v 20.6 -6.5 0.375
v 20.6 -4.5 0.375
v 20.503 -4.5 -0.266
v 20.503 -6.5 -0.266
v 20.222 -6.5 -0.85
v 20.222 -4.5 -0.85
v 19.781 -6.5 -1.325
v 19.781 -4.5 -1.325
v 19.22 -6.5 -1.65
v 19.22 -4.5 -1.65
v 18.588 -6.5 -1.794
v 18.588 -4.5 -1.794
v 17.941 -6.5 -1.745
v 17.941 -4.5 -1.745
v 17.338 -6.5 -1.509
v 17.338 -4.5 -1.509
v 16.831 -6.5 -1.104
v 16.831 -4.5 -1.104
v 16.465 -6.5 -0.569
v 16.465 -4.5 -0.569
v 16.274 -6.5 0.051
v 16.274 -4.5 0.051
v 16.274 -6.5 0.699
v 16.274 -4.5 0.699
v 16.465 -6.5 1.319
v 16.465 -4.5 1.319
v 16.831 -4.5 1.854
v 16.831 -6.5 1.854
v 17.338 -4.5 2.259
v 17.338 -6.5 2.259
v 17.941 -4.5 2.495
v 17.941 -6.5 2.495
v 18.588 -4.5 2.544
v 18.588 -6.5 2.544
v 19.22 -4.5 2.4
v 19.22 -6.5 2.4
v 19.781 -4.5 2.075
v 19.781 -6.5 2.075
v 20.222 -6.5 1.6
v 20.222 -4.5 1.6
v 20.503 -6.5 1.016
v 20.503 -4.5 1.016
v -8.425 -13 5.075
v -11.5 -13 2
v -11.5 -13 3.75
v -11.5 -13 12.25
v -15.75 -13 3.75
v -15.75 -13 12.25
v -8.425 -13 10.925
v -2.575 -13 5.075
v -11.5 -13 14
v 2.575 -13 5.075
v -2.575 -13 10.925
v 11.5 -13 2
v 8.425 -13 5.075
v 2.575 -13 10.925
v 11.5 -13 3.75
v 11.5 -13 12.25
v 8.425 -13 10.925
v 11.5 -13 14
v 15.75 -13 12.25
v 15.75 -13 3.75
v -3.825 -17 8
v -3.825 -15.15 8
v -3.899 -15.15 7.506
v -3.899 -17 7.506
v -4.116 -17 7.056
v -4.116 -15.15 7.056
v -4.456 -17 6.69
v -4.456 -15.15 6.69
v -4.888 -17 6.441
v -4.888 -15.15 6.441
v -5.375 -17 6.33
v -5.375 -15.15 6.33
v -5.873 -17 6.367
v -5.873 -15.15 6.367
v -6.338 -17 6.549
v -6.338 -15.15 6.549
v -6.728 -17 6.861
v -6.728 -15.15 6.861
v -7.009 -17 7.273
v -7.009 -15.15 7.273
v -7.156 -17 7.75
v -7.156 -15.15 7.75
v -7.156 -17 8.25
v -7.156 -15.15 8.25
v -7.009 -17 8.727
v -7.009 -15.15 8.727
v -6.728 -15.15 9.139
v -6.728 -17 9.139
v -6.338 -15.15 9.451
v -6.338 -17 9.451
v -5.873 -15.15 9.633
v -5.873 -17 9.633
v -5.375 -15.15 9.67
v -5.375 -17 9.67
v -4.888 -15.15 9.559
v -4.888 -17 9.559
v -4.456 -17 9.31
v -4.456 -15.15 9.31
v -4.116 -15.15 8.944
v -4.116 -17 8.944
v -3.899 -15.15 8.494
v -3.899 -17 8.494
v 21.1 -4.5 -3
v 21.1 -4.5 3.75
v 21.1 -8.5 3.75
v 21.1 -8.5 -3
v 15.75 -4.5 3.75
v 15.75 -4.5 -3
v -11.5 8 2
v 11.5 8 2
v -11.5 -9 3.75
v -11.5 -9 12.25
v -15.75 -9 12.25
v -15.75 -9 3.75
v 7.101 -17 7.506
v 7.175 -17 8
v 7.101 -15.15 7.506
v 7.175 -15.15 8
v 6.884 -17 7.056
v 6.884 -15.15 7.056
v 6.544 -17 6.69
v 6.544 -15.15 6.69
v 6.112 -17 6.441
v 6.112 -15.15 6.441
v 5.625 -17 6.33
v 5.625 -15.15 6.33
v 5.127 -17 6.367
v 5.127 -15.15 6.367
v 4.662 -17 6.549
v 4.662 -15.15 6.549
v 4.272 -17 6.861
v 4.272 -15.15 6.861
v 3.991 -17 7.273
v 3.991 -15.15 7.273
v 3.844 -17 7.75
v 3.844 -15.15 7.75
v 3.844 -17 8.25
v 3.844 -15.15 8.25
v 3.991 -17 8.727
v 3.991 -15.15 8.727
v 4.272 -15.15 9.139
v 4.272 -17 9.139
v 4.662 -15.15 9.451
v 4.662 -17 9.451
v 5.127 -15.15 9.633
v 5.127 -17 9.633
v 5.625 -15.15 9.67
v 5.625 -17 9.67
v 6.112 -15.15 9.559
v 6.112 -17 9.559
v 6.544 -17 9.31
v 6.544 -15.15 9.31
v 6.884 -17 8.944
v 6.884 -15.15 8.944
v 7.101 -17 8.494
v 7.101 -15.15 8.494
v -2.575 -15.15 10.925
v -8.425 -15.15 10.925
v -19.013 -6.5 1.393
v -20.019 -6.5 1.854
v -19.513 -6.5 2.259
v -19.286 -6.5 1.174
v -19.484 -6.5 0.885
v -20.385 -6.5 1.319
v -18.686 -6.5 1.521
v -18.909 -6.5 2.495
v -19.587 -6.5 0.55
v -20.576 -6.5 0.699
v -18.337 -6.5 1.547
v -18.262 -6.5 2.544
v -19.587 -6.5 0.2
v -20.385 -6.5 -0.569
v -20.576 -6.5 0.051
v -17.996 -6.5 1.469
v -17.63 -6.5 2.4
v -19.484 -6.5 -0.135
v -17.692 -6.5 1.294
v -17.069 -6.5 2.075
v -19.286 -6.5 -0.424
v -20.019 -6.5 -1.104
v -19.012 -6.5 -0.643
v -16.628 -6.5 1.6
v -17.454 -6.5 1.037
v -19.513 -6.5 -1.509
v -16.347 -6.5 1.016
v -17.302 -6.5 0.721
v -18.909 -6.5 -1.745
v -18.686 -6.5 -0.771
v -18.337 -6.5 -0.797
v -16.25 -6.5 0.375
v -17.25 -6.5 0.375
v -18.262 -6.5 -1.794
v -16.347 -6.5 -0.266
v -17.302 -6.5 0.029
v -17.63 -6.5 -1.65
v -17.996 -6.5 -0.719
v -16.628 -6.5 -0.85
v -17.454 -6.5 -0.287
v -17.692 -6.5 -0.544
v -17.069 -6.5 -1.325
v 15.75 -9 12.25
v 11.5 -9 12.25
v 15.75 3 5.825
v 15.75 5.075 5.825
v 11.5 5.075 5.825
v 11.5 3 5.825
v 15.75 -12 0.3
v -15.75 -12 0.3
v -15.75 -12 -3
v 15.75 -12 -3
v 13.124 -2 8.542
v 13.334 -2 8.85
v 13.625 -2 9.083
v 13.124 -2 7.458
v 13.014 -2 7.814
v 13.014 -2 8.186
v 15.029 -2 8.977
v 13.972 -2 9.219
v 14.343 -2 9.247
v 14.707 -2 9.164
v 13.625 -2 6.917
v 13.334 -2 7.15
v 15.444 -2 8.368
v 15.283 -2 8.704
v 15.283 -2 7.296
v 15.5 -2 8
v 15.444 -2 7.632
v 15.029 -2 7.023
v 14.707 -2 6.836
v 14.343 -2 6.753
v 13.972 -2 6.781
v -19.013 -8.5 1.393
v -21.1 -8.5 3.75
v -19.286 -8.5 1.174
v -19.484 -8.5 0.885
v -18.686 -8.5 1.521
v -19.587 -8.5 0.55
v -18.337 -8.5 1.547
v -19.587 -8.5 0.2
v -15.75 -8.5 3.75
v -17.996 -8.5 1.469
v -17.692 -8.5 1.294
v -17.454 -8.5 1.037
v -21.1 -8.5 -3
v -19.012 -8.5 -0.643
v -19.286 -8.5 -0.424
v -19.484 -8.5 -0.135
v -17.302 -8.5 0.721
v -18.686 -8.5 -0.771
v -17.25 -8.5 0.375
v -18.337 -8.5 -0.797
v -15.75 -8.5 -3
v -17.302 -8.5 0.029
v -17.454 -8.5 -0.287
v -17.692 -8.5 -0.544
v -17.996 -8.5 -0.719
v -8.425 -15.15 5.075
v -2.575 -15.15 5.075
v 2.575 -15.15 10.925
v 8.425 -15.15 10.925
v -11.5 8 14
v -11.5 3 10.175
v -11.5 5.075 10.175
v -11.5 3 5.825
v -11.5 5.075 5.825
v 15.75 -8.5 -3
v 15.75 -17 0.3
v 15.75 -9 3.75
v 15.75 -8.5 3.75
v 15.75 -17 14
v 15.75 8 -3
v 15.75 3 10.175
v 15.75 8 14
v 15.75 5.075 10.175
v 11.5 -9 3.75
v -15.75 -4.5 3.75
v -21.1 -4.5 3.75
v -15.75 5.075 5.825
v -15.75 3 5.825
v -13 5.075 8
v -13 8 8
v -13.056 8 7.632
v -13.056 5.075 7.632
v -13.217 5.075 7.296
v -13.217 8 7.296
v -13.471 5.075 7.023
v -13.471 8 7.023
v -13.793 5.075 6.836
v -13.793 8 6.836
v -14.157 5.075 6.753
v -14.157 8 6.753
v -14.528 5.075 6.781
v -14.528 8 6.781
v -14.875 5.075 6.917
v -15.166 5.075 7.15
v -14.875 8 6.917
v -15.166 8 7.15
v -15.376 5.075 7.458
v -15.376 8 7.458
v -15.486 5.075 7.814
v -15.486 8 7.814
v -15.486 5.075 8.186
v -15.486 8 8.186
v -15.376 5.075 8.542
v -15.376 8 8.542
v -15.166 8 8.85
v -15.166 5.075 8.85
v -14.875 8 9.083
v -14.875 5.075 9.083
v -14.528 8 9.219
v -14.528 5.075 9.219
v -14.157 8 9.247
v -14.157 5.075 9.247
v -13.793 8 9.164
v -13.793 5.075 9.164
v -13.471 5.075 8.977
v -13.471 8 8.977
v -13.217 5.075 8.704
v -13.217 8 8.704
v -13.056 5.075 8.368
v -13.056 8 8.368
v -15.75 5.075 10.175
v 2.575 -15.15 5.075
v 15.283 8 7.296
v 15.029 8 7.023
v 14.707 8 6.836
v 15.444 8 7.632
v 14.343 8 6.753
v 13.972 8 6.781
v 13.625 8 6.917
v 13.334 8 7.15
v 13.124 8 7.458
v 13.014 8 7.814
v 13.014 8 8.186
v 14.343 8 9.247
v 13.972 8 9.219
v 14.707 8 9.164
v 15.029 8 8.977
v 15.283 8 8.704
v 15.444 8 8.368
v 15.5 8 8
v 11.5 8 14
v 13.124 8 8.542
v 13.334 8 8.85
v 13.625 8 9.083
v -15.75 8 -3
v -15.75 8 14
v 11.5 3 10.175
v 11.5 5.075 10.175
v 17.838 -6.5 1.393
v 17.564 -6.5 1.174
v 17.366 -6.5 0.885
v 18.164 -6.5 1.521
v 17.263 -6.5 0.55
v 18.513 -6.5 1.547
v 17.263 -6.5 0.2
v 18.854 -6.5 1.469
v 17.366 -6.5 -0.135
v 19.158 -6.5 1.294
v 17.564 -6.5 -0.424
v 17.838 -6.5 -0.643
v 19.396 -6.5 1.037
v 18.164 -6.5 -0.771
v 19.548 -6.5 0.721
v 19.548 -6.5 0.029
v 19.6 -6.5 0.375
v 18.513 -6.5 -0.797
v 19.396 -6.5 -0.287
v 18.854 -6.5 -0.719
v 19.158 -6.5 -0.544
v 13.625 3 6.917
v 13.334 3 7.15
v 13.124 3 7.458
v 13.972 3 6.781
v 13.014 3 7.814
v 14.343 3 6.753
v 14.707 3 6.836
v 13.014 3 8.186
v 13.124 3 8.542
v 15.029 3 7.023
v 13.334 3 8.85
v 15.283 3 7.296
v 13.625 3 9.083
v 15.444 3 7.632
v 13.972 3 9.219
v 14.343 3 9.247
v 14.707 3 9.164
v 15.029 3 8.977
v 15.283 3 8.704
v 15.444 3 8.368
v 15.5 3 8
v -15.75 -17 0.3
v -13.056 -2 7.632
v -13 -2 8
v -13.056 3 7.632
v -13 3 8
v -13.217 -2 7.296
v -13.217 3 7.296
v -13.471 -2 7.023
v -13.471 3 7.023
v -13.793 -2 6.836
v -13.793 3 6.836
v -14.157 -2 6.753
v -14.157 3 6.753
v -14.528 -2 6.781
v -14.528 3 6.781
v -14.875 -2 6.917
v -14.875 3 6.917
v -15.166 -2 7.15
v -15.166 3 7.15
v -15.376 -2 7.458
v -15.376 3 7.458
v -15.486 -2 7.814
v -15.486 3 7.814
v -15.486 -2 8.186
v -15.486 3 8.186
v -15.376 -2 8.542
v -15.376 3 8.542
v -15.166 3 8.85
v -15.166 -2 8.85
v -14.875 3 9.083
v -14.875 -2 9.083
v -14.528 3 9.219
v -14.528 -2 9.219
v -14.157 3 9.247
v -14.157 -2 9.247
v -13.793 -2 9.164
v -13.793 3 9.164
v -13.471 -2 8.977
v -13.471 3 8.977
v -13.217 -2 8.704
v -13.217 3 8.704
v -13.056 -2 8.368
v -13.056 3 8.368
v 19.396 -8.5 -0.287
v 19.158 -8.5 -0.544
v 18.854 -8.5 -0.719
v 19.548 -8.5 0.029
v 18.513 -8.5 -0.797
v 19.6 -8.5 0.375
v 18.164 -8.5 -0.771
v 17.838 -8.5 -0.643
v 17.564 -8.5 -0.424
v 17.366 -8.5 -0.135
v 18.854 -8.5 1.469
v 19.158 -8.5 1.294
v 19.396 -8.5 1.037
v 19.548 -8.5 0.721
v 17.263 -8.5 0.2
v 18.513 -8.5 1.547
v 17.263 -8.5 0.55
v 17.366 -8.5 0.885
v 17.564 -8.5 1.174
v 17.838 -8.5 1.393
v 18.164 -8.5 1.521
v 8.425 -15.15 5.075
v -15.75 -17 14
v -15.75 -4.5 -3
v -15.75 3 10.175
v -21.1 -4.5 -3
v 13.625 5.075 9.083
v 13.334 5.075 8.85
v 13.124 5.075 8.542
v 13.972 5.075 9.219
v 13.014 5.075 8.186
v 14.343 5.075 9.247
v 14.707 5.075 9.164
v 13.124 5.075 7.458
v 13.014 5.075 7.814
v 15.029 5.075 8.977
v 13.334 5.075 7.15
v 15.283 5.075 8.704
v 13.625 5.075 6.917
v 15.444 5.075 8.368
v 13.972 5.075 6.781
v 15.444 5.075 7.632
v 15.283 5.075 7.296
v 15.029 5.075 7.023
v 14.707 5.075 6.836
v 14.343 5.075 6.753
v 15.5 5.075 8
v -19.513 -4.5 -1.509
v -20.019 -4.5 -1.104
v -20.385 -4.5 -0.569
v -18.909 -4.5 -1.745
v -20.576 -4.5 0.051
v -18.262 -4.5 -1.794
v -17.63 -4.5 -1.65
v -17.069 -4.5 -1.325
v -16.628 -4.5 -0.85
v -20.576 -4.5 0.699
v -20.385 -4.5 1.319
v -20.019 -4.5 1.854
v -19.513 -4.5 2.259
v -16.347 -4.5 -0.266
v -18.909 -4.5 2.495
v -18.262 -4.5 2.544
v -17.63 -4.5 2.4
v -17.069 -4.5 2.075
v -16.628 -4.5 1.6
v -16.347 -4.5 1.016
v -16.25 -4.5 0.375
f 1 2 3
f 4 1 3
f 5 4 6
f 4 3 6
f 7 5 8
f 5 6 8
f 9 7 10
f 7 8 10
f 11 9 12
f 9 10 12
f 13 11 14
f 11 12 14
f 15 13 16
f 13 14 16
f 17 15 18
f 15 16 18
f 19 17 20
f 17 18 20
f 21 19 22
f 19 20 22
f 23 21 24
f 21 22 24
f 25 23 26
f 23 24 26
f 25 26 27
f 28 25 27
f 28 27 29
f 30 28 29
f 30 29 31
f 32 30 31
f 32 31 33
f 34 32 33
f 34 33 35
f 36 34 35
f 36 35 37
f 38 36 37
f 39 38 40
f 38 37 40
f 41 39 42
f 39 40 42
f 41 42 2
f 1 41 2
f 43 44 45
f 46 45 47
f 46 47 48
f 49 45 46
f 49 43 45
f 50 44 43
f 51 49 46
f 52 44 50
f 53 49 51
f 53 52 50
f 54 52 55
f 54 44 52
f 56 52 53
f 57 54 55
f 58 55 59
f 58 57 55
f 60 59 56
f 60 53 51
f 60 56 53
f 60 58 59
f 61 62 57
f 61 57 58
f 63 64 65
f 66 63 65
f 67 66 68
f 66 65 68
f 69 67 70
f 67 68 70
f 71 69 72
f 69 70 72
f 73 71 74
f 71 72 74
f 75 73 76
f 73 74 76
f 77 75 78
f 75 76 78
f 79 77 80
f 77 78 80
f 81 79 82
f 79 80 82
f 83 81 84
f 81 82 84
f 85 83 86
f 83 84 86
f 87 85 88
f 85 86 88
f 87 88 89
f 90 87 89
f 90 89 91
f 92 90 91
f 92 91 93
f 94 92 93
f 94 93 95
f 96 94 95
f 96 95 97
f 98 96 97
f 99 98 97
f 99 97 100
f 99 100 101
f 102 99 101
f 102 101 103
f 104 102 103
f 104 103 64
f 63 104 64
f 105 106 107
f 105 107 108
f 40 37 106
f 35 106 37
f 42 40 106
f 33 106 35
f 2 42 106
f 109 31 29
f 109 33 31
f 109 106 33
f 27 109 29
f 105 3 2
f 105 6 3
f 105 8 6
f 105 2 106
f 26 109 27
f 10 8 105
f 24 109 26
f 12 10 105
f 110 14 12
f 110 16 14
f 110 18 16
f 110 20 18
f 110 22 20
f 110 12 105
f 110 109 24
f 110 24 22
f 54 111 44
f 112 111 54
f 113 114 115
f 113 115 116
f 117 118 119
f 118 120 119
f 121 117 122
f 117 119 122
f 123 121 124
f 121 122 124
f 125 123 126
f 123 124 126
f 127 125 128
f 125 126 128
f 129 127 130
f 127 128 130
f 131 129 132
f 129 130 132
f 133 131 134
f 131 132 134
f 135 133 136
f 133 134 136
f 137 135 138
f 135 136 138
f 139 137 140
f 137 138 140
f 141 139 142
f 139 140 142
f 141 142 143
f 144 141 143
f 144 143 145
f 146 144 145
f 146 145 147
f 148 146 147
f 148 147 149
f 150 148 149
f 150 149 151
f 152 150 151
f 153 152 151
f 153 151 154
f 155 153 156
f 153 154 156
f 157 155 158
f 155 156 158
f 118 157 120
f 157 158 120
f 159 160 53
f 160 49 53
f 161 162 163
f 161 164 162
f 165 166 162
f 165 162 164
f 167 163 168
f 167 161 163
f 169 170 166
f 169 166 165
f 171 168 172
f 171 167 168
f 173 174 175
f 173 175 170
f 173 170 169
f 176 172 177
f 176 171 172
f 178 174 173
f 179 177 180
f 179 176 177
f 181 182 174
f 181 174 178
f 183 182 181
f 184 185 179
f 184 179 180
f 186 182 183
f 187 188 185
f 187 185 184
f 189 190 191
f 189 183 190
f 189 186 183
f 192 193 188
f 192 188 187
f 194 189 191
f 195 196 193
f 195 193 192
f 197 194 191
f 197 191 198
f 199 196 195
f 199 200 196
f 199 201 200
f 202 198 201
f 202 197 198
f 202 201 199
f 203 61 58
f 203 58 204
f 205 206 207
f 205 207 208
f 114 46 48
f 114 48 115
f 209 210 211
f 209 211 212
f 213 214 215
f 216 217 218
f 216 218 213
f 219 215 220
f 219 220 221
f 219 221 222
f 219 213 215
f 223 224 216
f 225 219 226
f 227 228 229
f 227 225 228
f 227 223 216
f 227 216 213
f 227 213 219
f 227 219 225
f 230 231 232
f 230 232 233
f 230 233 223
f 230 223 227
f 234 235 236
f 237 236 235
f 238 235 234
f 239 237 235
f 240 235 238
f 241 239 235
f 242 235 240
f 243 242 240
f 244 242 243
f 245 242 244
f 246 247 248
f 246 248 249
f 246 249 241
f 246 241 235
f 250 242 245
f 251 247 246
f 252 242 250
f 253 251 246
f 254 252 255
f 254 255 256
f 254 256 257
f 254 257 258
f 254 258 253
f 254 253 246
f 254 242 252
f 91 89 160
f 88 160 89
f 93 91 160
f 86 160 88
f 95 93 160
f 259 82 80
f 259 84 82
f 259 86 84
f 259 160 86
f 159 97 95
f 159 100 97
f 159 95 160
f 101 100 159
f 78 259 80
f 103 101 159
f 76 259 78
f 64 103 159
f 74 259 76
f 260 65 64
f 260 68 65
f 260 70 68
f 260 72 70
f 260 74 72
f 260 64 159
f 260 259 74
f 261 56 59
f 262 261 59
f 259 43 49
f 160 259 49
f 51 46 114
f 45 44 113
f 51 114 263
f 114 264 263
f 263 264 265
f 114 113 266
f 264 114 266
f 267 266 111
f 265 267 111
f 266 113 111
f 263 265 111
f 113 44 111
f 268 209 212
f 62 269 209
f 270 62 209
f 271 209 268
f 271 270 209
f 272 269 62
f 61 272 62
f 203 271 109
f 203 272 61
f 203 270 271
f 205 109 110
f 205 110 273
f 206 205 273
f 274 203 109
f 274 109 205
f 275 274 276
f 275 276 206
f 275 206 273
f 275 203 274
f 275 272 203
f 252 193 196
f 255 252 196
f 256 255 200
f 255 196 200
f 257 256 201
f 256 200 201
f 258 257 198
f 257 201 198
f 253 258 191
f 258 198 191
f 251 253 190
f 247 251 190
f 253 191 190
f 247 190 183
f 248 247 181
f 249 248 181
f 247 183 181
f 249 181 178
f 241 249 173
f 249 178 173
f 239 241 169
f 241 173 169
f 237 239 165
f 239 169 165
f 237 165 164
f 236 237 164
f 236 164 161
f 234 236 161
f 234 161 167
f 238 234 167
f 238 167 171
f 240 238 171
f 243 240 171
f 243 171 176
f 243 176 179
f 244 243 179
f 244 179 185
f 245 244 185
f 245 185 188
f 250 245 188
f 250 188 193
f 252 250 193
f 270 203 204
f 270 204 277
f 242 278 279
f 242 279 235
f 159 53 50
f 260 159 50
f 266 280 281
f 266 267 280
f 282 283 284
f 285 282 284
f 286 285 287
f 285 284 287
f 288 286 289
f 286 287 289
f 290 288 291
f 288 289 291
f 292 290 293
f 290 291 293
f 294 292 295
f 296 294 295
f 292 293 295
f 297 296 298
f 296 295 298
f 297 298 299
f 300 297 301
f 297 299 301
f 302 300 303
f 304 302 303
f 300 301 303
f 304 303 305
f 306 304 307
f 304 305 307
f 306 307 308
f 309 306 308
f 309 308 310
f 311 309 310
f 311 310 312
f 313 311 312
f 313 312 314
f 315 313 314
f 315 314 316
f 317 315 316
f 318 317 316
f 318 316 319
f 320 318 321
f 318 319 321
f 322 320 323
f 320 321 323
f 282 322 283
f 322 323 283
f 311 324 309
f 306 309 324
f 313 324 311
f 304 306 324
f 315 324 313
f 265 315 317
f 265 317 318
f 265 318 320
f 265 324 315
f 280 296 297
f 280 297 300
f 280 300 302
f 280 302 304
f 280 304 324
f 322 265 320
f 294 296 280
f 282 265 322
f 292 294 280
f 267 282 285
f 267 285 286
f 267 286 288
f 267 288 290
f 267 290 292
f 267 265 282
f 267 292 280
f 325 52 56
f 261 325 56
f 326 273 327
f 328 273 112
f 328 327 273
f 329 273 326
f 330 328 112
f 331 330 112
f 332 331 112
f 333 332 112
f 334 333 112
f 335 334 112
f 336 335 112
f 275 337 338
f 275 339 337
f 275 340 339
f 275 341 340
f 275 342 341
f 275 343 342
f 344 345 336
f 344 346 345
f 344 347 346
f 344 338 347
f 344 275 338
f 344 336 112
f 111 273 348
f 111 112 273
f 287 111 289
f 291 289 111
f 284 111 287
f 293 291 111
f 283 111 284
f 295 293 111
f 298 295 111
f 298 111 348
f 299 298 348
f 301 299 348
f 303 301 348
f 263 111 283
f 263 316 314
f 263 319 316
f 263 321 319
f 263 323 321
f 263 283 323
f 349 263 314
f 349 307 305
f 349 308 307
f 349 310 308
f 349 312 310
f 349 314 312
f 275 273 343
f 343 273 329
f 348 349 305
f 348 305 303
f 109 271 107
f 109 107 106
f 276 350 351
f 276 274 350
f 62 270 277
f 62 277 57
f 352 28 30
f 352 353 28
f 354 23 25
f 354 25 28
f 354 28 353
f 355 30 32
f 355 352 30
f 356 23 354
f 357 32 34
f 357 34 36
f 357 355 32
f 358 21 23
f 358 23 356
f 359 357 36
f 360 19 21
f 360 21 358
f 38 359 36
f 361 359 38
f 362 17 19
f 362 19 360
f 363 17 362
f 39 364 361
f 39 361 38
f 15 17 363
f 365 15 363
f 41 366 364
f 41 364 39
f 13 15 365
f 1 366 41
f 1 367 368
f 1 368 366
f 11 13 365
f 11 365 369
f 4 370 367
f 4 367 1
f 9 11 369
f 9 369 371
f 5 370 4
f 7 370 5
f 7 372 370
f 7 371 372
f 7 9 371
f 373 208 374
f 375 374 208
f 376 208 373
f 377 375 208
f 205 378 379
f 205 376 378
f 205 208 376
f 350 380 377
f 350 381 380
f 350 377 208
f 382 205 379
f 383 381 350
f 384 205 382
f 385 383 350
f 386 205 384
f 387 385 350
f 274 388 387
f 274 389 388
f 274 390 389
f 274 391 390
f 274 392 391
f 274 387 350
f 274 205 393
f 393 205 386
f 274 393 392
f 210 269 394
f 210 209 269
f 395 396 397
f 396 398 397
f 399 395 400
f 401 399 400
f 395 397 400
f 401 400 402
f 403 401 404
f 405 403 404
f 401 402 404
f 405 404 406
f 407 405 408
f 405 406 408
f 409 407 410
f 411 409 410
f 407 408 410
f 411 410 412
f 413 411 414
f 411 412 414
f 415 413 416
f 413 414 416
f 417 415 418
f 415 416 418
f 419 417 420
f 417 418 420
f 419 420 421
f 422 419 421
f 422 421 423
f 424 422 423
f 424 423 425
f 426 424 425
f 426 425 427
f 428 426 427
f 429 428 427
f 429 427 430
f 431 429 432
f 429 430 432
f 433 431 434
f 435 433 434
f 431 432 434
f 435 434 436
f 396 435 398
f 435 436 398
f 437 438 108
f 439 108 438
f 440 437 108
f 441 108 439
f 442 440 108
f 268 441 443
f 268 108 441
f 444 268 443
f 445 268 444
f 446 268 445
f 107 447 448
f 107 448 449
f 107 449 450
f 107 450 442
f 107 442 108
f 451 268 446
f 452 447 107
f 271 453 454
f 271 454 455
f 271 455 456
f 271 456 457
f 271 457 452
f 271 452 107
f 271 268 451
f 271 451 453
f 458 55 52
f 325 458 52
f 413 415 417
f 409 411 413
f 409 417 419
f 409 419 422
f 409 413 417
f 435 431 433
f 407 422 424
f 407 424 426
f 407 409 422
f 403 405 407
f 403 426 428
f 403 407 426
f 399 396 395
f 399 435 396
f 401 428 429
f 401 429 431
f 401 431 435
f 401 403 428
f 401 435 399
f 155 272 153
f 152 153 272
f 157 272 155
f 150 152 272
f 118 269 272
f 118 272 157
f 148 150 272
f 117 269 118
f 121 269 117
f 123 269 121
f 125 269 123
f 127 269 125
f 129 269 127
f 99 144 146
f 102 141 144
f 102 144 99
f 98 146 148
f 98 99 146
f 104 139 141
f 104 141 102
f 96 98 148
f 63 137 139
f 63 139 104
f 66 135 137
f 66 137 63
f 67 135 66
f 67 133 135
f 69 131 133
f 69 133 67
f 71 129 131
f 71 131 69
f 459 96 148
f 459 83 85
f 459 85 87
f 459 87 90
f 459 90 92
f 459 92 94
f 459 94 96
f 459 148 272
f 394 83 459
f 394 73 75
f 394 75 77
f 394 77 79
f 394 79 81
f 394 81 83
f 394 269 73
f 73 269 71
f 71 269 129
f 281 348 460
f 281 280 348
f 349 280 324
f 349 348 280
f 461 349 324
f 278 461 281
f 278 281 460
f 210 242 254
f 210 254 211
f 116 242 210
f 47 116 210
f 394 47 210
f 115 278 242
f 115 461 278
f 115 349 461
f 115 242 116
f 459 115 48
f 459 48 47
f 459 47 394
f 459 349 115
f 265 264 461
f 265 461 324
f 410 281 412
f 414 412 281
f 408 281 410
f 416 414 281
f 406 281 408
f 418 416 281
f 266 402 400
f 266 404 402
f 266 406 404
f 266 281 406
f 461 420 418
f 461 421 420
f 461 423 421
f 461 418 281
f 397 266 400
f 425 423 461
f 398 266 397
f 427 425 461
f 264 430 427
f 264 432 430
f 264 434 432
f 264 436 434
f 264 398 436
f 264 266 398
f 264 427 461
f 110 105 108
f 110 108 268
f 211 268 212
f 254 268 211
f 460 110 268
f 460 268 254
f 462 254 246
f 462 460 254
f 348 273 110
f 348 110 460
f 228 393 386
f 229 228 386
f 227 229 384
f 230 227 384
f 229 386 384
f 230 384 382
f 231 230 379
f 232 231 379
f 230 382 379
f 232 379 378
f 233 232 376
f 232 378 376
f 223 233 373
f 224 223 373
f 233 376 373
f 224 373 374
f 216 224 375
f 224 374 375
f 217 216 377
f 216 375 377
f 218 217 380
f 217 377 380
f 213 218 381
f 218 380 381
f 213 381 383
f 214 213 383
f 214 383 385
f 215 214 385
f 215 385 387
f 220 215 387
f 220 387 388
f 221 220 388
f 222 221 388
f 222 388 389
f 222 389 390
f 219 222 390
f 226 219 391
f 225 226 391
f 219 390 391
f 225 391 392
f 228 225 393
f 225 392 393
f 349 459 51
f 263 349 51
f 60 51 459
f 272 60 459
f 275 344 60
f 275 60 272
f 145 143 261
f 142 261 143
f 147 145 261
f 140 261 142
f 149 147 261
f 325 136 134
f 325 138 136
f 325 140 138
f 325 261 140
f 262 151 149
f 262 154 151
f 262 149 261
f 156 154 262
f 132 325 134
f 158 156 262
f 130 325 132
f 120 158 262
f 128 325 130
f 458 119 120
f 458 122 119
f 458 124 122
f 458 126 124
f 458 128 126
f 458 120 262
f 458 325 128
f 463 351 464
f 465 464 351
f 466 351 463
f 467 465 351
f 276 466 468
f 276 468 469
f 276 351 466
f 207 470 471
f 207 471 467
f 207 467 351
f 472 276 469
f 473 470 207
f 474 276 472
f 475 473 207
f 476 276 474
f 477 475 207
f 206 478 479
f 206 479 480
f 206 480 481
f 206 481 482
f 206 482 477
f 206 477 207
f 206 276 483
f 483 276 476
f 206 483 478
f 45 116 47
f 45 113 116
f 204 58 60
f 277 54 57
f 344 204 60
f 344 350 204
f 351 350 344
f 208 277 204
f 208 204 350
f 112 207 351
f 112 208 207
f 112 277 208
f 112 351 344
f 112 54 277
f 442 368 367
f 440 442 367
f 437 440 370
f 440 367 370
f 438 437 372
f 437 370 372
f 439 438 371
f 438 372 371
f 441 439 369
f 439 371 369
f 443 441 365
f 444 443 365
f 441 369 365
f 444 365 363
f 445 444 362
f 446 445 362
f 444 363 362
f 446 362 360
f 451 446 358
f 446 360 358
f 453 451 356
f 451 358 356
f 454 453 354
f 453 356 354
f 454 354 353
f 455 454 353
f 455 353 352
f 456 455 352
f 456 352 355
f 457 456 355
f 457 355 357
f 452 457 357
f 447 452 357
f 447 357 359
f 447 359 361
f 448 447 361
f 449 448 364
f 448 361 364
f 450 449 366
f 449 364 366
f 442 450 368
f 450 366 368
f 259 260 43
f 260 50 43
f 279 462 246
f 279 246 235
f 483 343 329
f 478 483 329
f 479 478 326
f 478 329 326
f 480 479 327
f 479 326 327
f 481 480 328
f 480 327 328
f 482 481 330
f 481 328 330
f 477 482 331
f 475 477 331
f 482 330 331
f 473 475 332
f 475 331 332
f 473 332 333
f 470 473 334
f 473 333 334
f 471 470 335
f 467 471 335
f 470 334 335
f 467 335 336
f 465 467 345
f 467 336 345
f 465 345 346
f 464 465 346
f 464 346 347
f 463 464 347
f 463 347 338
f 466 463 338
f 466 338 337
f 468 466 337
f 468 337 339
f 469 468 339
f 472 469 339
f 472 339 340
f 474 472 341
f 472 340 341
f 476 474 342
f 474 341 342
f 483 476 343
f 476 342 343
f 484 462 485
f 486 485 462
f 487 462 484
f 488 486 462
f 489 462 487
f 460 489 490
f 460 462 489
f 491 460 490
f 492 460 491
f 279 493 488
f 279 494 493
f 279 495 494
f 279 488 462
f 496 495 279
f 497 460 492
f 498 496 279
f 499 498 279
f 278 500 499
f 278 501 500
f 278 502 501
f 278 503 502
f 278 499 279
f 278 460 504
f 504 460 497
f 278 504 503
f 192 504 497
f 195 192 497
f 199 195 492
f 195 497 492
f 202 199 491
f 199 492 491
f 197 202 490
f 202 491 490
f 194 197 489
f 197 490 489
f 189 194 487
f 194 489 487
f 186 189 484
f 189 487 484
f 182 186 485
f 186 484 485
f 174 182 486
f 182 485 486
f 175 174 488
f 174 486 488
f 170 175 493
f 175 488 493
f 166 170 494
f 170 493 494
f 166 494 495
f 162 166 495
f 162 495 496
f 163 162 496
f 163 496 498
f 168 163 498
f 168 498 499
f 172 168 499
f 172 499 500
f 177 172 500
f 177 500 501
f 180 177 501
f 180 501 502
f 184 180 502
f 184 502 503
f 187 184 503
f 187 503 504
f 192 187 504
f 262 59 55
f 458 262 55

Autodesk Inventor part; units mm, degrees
ref_plane "YZ Plane" through (0, 0, 0) normal (1, 0, 0) x (0, 1, 0)
ref_plane "XZ Plane" through (0, 0, 0) normal (0, 1, 0) x (-1, 0, 0)
ref_plane "XY Plane" through (0, 0, 0) normal (0, 0, 1) x (1, 0, 0)
sketch "Sketch1" plane through (0, 0, 0) normal (0, 0, 1) x (1, 0, 0)
  line L0 (-15.75, 17) -> (15.75, 17)
  line L1 (15.75, 17) -> (15.75, -17)
  line L2 (15.75, -17) -> (-15.75, -17)
  line L3 (-15.75, -17) -> (-15.75, 17)
  point P0 (0, 0)
  point P1 (15.75, 0)
  point P2 (0, 17)
  dimension "d0" = 34
  dimension "d1" = 31.5
extrude "Extrusion1" add sketch "Sketch1" along normal blind 2
sketch "Sketch2" plane through (0, 0, 2) normal (0, 0, 1) x (1, 0, 0)
  line L0 (-11.5, 8) -> (-15.75, 8)
  line L1 (-15.75, 8) -> (-15.75, -13)
  line L2 (-15.75, -13) -> (-11.5, -13)
  line L3 (-11.5, -13) -> (-11.5, 8)
  line L4 (11.5, 8) -> (15.75, 8)
  line L5 (15.75, 8) -> (15.75, -13)
  line L6 (15.75, -13) -> (11.5, -13)
  line L7 (11.5, -13) -> (11.5, 8)
  line L8 (15.75, -13) -> (-15.75, -13)
  line L9 (-15.75, -13) -> (-15.75, -17)
  line L10 (-15.75, -17) -> (15.75, -17)
  line L11 (15.75, -17) -> (15.75, -13)
  line L12 (-15.75, 17) -> (-15.75, -17) projected
  line L13 (15.75, 17) -> (-15.75, 17) projected
  line L14 (15.75, -17) -> (15.75, 17) projected
  line L15 (-15.75, -17) -> (15.75, -17) projected
  point P0 (0, 0)
  dimension "d4" = 23
  dimension "d5" = 4
  dimension "d67" = 21
extrude "Extrusion2" add sketch "Sketch2" along normal blind 12 contours L3 L2 L1 L0 | L8 L6 L11 L10 L9 L2 | L7 L4 L5 L6
sketch "Sketch8" plane through (-11.5, -13, 2) normal (0, 1, 0) x (1, 0, 0)
  circle A0 centre (6, -6) radius 6 construction
  circle A1 centre (17, -6) radius 6 construction
  line L0 (0, 0) -> (0, -12) construction
  line L1 (23, -12) -> (0, -12) construction
  line L2 (0, 0) -> (23, 0) construction
  line L3 (23, 0) -> (23, -12) construction
  circle A2 centre (6, -6) radius 1.675
  circle A3 centre (17, -6) radius 1.675
  point P0 (11.5, 2)
  dimension "d29" = 3.35
extrude "Extrusion8" cut sketch "Sketch8" against normal through all
sketch "Sketch9" plane through (-11.5, -13, 2) normal (0, 1, 0) x (1, 0, 0)
  line L0 (3.075, -8.925) -> (8.925, -8.925)
  line L1 (8.925, -8.925) -> (8.925, -3.075)
  line L2 (8.925, -3.075) -> (3.075, -3.075)
  line L3 (3.075, -3.075) -> (3.075, -8.925)
  line L4 (14.075, -8.925) -> (19.925, -8.925)
  line L5 (19.925, -8.925) -> (19.925, -3.075)
  line L6 (19.925, -3.075) -> (14.075, -3.075)
  line L7 (14.075, -3.075) -> (14.075, -8.925)
  circle A0 centre (6, -6) radius 1.675 projected
  circle A1 centre (17, -6) radius 1.675 projected
  point P0 (11.5, 2)
  point P1 (6, -3.075)
  point P2 (17, -3.075)
  point P3 (3.075, -6)
  point P4 (14.075, -6)
  dimension "d32" = 5.85
extrude "Extrusion9" cut sketch "Sketch9" against normal blind 2.15
sketch "Sketch10" plane through (0, 0, 0) normal (0, 0, -1) x (-1, 0, 0)
  line L0 (-15.75, 17) -> (15.75, 17)
  line L1 (15.75, 17) -> (15.75, -12)
  line L2 (15.75, -12) -> (-15.75, -12)
  line L3 (-15.75, -12) -> (-15.75, 17)
  line L4 (-15.75, -17) -> (15.75, -17) projected
  line L5 (15.75, 17) -> (-15.75, 17) projected
  line L6 (-15.75, 17) -> (-15.75, -17) projected
  point P0 (0, 0)
  point P1 (0, 17)
  point P2 (15.75, 2.5)
  dimension "d36" = 29
extrude "Extrusion10" add sketch "Sketch10" along normal blind 3
sketch "Sketch16" plane through (15.75, -17, 14) normal (1, 0, 0) x (0, 0, -1)
  line L0 (1.75, 8) -> (10.25, 8)
  line L1 (10.25, 8) -> (10.25, 4)
  line L2 (10.25, 4) -> (1.75, 4)
  line L3 (1.75, 4) -> (1.75, 8)
  line L4 (12, 4) -> (0, 4) projected
  point P0 (14, 17)
  point P1 (6, 8)
  point P2 (6, 4)
  point P3 (6, 4)
  dimension "d62" = 8.5
  dimension "d63" = 4
extrude "Extrusion16" cut sketch "Sketch16" against normal through all
sketch "Sketch20" plane through (-15.75, 8, 2) normal (0, 1, 0) x (1, 0, 0)
  circle A0 centre (1.5, -6) radius 1.25
  circle A1 centre (30, -6) radius 1.25
  line L0 (4.25, -12) -> (0, -12) projected
  line L1 (4.25, 0) -> (4.25, -12) projected
  line L2 (27.25, 0) -> (27.25, -12) projected
  point P0 (15.75, 2)
  point P1 (4.25, -6)
  dimension "d90" = 2.5
  dimension "d92" = 1.5
  dimension "d93" = 1.5
extrude "Extrusion20" cut sketch "Sketch20" against normal blind 10
sketch "Sketch21" plane through (-15.75, -17, 14) normal (-1, 0, 0) x (0, 0, 1)
  line L0 (-17, 12.5) -> (-10.25, 12.5)
  line L1 (-10.25, 12.5) -> (-10.25, 8.5)
  line L2 (-10.25, 8.5) -> (-17, 8.5)
  line L3 (-17, 8.5) -> (-17, 12.5)
  line L4 (-14, 0) -> (0, 0) projected
  line L5 (-17, 5) -> (-17, 34) projected
  point P0 (-14, 17)
  point P1 (-17, 7)
  point P2 (-10.25, 8)
  dimension "d96" = 8.5
  dimension "d100" = 4
extrude "Extrusion21" add sketch "Sketch21" along normal blind 5.35
sketch "Sketch24" plane through (15.75, -17, 14) normal (1, 0, 0) x (0, 0, -1)
  line L0 (10.25, 12.5) -> (17, 12.5)
  line L1 (17, 12.5) -> (17, 8.5)
  line L2 (17, 8.5) -> (10.25, 8.5)
  line L3 (10.25, 8.5) -> (10.25, 12.5)
  line L4 (17, 34) -> (17, 5) projected
  line L5 (14, 0) -> (0, 0) projected
  point P0 (14, 17)
  point P1 (17, 7)
  point P2 (10.25, 8)
  dimension "d107" = 8.5
  dimension "d108" = 4
extrude "Extrusion24" add sketch "Sketch24" along normal blind 5.35
sketch "Sketch22" plane through (-15.75, -4.5, 3.75) normal (0, 1, 0) x (1, 0, 0)
  circle A0 centre (-2.675, 3.375) radius 1.175
  line L0 (-5.35, 0) -> (-5.35, 6.75) projected
  line L1 (0, 0) -> (-5.35, 0) projected
  circle A1 centre (34.175, 3.375) radius 1.175
  line L2 (31.5, 0) -> (36.85, 0) projected
  point P0 (15.75, 3.75)
  point P1 (-5.35, 3.375)
  point P2 (-2.675, 0)
  point P3 (34.175, 0)
  dimension "d101" = 2.35
extrude "Extrusion22" cut sketch "Sketch22" against normal through all
sketch "Sketch23" plane through (-15.75, -4.5, 3.75) normal (0, 1, 0) x (1, 0, 0)
  circle A0 centre (-2.675, 3.375) radius 2.175
  circle A1 centre (-2.675, 3.375) radius 1.175 projected
  circle A2 centre (34.175, 3.375) radius 2.175
  circle A3 centre (34.175, 3.375) radius 1.175 projected
  point P0 (15.75, 3.75)
  dimension "d104" = 4.35
extrude "Extrusion23" cut sketch "Sketch23" against normal blind 2
sketch "Sketch25" plane through (15.75, -17, 14) normal (1, 0, 0) x (0, 0, -1)
  line L0 (3.825, 22.075) -> (8.175, 22.075)
  line L1 (8.175, 22.075) -> (8.175, 20)
  line L2 (8.175, 20) -> (3.825, 20)
  line L3 (3.825, 20) -> (3.825, 22.075)
  line L4 (12, 25) -> (0, 25) projected
  point P0 (14, 17)
  point P1 (6, 25)
  point P2 (6, 22.075)
  dimension "d111" = 5
  dimension "d112" = 2.075
  dimension "d113" = 4.35
extrude "Extrusion25" cut sketch "Sketch25" against normal through all
sketch "Sketch26" plane through (0, 0, 2) normal (0, 0, 1) x (1, 0, 0)
  line L0 (-15.75, 17) -> (15.75, 17)
  line L1 (15.75, 17) -> (15.75, 8)
  line L2 (15.75, 8) -> (-15.75, 8)
  line L3 (-15.75, 8) -> (-15.75, 17)
  line L4 (11.5, 8) -> (15.75, 8) projected
  line L5 (15.75, 8) -> (15.75, 17) projected
  line L6 (-15.75, 17) -> (-15.75, 8) projected
  line L7 (15.75, 17) -> (-15.75, 17) projected
  point P0 (0, 0)
extrude "Extrusion26" cut sketch "Sketch26" against normal through all
sketch "Sketch27" plane through (0, 0, 0) normal (0, 0, -1) x (-1, 0, 0)
  line L0 (-15.75, -17) -> (15.75, -17) projected
  line L1 (15.75, -12) -> (-15.75, -12) projected
  line L2 (15.75, -17) -> (-15.75, -17)
  line L3 (-15.75, -17) -> (-15.75, -12)
  line L4 (-15.75, -12) -> (15.75, -12)
  line L5 (15.75, -12) -> (15.75, -17)
  point P0 (0, 0)
extrude "Extrusion27" cut sketch "Sketch27" against normal blind 0.3
equation "\"d1\" = servo_D"
equation "\"d4\" = servo_A"
equation "\"d5\" = bot_mat"
equation "\"d67\" = servo_E"
equation "\"d6\" = servo_B"
equation "\"d33\" = nut_B"
equation "\"d92\" = servo_L"
equation "\"d93\" = d92"
equation "\"d109\" = d97"
equation "\"d112\" = nut_B_1 + Tolerance"
equation "\"d113\" = nut_A_1"
equation "\"bot_mat\" = 4"
equation "\"servo_D\" = 31.5"
equation "\"servo_A\" = 23"
equation "\"servo_E\" = 21"
equation "\"servo_B\" = 12"
equation "\"nut_B\" = 2.15"
equation "\"servo_L\" = 1.5"
equation "\"d97\" = 5.35"
equation "\"nut_B_1\" = 1.725"
equation "\"Tolerance\" = 0.35"
equation "\"nut_A_1\" = 4.35"
properties part number "HIP"
